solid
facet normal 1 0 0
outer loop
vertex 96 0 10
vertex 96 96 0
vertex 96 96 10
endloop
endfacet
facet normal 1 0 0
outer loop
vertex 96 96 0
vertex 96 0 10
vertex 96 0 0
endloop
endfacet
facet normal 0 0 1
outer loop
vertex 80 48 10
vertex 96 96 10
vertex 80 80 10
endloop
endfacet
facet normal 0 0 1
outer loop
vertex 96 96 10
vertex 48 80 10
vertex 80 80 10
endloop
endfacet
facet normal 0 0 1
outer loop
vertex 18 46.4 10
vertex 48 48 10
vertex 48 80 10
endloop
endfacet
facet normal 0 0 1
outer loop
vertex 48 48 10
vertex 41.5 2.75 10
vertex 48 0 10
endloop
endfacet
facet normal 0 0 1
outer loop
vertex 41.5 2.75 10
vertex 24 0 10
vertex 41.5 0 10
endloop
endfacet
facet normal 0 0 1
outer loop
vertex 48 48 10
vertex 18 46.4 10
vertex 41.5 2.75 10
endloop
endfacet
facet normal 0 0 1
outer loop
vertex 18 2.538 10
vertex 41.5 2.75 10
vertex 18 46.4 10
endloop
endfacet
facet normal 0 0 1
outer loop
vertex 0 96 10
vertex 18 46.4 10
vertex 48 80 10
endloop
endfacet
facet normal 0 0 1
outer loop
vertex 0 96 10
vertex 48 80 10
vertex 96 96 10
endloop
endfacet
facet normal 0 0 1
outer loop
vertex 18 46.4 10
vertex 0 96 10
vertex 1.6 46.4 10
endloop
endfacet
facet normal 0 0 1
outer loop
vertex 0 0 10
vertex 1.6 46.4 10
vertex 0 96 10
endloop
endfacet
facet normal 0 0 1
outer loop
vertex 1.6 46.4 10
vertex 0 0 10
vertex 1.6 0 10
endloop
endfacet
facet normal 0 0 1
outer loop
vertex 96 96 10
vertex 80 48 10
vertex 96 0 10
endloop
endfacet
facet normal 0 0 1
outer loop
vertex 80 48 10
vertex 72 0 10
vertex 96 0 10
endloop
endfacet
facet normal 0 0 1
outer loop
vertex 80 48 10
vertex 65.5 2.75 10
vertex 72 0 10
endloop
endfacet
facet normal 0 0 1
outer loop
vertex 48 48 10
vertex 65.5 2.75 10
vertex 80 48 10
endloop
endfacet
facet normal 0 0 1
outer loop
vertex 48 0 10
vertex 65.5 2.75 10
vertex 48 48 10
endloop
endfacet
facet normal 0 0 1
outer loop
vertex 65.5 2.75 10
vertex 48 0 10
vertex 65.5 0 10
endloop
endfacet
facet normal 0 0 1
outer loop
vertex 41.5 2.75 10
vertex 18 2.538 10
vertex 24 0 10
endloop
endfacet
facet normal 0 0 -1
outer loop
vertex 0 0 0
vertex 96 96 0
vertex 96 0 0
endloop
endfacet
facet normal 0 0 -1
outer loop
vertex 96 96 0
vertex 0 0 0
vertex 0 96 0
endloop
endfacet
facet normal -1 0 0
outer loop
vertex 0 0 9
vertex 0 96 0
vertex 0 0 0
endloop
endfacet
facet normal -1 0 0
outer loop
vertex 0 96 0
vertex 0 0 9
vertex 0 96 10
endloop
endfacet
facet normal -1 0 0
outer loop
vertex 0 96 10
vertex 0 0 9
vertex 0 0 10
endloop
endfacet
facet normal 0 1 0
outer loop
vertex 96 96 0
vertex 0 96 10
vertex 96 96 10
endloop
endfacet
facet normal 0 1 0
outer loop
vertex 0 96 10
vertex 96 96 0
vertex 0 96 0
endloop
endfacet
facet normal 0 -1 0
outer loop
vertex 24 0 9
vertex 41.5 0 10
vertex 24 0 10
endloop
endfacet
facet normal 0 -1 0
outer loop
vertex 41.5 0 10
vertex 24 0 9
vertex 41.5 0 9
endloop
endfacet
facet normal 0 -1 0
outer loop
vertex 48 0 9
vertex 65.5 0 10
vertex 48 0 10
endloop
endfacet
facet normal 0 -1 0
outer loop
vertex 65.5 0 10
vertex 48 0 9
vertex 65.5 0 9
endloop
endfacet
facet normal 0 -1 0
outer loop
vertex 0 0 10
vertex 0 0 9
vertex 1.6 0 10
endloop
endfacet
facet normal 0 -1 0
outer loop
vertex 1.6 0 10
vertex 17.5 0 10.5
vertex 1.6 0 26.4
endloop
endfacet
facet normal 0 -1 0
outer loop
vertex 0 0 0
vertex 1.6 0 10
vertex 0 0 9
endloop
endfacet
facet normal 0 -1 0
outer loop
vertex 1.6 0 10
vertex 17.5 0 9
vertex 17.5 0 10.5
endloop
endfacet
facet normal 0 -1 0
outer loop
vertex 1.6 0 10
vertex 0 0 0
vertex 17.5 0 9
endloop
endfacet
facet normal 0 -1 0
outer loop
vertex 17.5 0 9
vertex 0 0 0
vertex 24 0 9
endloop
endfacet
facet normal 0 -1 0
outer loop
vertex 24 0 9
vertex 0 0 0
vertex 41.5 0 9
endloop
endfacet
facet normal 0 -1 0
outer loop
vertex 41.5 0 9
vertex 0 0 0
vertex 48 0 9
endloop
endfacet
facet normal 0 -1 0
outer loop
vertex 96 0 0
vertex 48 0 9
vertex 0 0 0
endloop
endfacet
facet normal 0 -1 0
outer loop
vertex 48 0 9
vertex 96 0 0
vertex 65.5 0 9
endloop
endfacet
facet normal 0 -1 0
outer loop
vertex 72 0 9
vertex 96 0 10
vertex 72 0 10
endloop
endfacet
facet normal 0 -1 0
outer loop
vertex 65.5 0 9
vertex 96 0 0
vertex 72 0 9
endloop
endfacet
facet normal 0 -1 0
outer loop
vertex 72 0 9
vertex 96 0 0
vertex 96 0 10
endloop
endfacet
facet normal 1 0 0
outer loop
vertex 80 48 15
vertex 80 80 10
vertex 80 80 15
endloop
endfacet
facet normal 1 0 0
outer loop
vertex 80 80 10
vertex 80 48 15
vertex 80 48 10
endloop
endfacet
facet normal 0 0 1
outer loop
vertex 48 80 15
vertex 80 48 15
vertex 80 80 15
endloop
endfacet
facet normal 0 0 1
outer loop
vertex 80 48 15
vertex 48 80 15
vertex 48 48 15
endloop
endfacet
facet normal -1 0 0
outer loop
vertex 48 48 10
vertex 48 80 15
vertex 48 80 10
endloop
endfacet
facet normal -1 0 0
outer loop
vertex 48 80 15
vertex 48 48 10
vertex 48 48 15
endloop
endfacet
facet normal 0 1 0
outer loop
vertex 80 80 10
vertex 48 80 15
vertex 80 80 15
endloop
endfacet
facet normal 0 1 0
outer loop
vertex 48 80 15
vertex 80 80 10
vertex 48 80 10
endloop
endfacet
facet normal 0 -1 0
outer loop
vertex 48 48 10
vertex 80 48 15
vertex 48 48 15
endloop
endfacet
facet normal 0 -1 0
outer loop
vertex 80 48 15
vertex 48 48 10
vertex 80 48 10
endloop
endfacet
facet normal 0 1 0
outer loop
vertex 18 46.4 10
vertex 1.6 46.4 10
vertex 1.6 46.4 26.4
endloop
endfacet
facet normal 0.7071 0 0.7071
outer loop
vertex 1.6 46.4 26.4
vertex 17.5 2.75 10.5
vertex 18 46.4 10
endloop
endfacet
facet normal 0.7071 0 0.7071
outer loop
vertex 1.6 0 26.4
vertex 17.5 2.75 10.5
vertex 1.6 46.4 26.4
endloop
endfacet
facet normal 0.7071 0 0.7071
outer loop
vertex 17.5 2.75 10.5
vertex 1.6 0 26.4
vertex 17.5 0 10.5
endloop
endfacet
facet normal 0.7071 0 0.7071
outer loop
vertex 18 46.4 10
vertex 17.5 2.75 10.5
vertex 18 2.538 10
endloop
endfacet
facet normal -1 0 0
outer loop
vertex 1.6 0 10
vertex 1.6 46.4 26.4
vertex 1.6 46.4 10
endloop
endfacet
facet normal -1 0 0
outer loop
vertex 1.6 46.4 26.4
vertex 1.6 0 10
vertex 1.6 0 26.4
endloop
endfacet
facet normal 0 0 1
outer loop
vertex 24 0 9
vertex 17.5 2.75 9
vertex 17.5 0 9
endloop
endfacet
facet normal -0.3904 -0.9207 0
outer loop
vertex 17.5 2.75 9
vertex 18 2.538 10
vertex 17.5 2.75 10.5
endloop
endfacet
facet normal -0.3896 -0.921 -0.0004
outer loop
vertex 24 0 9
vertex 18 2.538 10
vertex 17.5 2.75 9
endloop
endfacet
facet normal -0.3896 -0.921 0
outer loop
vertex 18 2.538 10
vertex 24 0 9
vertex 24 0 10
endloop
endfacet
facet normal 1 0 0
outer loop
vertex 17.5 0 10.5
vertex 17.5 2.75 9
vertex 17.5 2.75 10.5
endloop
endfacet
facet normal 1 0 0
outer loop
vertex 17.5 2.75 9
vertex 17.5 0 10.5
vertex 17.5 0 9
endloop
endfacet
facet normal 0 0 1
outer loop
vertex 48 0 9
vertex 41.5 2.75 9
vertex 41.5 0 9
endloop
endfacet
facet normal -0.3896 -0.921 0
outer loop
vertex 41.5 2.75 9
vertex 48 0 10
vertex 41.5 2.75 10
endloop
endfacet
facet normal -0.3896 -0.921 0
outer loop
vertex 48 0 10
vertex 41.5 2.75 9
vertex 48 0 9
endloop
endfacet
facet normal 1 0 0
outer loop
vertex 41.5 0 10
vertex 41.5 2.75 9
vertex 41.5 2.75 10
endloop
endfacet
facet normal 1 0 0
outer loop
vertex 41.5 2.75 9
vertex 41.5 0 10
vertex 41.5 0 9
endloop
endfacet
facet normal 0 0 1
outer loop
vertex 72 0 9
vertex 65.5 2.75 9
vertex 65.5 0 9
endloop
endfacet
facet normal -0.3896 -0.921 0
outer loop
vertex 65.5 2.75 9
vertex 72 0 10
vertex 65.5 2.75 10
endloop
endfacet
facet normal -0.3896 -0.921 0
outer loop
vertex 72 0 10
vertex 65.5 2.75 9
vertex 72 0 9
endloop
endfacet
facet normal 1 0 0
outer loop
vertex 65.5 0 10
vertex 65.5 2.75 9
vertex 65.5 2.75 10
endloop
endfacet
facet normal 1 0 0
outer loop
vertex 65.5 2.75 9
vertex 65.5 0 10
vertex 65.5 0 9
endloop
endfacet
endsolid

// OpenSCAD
$fn = 32;
// ----------------------------------------------------------------------
// Freeform cube: 96 x 96 x 10
// ----------------------------------------------------------------------
// --- parameters (mm) ---
base_len = 96;            // base length, X
base_w = 96;              // base width, Y
base_h = 10;              // base height, Z
top_len = 32;             // top length, X
top_w = 32;               // top width, Y
top_h = 6;                // top height, Z
hole_d = 4.5;             // clearance for M4
slot_w = 5.5;             // adjustment slot width
slot_l = 13;              // adjustment slot length
rib_leg = 18;             // gusset leg
rib_sink = 1.6;           // gusset overlap into the base
module base() {
  cube([base_len, base_w, base_h]);
}
module top() {
  translate([base_len / 2, base_w / 2, base_h - 1])
    cube([top_len, top_w, top_h]);
}
module gusset() {
  translate([0, base_w / 2 - rib_sink, base_h - rib_sink])
    rotate([90, 0, 0])
      linear_extrude(height = base_w / 2 - rib_sink)
        polygon(points = [[rib_sink, rib_sink], [rib_leg, rib_sink], [rib_sink, rib_leg]]);
}
module adjustment_slots() {
  for (i = [0:3]) {
    translate([base_len * i / 4, -slot_w / 2, base_h - 1])
      linear_extrude(height = slot_w + 1)
        polygon(points = [[-slot_l / 2, 0], [slot_l / 2, 0], [-slot_l / 2, slot_w]]);
  }
}
difference() {
  union() {
    base();
    top();
    gusset();
  }
  adjustment_slots();
  for (i = [0:3]) translate([base_len * i / 4, -slot_w / 2 - 1, base_h - 1])
    cylinder(h = base_h - 1, d = slot_w + 2);
}
